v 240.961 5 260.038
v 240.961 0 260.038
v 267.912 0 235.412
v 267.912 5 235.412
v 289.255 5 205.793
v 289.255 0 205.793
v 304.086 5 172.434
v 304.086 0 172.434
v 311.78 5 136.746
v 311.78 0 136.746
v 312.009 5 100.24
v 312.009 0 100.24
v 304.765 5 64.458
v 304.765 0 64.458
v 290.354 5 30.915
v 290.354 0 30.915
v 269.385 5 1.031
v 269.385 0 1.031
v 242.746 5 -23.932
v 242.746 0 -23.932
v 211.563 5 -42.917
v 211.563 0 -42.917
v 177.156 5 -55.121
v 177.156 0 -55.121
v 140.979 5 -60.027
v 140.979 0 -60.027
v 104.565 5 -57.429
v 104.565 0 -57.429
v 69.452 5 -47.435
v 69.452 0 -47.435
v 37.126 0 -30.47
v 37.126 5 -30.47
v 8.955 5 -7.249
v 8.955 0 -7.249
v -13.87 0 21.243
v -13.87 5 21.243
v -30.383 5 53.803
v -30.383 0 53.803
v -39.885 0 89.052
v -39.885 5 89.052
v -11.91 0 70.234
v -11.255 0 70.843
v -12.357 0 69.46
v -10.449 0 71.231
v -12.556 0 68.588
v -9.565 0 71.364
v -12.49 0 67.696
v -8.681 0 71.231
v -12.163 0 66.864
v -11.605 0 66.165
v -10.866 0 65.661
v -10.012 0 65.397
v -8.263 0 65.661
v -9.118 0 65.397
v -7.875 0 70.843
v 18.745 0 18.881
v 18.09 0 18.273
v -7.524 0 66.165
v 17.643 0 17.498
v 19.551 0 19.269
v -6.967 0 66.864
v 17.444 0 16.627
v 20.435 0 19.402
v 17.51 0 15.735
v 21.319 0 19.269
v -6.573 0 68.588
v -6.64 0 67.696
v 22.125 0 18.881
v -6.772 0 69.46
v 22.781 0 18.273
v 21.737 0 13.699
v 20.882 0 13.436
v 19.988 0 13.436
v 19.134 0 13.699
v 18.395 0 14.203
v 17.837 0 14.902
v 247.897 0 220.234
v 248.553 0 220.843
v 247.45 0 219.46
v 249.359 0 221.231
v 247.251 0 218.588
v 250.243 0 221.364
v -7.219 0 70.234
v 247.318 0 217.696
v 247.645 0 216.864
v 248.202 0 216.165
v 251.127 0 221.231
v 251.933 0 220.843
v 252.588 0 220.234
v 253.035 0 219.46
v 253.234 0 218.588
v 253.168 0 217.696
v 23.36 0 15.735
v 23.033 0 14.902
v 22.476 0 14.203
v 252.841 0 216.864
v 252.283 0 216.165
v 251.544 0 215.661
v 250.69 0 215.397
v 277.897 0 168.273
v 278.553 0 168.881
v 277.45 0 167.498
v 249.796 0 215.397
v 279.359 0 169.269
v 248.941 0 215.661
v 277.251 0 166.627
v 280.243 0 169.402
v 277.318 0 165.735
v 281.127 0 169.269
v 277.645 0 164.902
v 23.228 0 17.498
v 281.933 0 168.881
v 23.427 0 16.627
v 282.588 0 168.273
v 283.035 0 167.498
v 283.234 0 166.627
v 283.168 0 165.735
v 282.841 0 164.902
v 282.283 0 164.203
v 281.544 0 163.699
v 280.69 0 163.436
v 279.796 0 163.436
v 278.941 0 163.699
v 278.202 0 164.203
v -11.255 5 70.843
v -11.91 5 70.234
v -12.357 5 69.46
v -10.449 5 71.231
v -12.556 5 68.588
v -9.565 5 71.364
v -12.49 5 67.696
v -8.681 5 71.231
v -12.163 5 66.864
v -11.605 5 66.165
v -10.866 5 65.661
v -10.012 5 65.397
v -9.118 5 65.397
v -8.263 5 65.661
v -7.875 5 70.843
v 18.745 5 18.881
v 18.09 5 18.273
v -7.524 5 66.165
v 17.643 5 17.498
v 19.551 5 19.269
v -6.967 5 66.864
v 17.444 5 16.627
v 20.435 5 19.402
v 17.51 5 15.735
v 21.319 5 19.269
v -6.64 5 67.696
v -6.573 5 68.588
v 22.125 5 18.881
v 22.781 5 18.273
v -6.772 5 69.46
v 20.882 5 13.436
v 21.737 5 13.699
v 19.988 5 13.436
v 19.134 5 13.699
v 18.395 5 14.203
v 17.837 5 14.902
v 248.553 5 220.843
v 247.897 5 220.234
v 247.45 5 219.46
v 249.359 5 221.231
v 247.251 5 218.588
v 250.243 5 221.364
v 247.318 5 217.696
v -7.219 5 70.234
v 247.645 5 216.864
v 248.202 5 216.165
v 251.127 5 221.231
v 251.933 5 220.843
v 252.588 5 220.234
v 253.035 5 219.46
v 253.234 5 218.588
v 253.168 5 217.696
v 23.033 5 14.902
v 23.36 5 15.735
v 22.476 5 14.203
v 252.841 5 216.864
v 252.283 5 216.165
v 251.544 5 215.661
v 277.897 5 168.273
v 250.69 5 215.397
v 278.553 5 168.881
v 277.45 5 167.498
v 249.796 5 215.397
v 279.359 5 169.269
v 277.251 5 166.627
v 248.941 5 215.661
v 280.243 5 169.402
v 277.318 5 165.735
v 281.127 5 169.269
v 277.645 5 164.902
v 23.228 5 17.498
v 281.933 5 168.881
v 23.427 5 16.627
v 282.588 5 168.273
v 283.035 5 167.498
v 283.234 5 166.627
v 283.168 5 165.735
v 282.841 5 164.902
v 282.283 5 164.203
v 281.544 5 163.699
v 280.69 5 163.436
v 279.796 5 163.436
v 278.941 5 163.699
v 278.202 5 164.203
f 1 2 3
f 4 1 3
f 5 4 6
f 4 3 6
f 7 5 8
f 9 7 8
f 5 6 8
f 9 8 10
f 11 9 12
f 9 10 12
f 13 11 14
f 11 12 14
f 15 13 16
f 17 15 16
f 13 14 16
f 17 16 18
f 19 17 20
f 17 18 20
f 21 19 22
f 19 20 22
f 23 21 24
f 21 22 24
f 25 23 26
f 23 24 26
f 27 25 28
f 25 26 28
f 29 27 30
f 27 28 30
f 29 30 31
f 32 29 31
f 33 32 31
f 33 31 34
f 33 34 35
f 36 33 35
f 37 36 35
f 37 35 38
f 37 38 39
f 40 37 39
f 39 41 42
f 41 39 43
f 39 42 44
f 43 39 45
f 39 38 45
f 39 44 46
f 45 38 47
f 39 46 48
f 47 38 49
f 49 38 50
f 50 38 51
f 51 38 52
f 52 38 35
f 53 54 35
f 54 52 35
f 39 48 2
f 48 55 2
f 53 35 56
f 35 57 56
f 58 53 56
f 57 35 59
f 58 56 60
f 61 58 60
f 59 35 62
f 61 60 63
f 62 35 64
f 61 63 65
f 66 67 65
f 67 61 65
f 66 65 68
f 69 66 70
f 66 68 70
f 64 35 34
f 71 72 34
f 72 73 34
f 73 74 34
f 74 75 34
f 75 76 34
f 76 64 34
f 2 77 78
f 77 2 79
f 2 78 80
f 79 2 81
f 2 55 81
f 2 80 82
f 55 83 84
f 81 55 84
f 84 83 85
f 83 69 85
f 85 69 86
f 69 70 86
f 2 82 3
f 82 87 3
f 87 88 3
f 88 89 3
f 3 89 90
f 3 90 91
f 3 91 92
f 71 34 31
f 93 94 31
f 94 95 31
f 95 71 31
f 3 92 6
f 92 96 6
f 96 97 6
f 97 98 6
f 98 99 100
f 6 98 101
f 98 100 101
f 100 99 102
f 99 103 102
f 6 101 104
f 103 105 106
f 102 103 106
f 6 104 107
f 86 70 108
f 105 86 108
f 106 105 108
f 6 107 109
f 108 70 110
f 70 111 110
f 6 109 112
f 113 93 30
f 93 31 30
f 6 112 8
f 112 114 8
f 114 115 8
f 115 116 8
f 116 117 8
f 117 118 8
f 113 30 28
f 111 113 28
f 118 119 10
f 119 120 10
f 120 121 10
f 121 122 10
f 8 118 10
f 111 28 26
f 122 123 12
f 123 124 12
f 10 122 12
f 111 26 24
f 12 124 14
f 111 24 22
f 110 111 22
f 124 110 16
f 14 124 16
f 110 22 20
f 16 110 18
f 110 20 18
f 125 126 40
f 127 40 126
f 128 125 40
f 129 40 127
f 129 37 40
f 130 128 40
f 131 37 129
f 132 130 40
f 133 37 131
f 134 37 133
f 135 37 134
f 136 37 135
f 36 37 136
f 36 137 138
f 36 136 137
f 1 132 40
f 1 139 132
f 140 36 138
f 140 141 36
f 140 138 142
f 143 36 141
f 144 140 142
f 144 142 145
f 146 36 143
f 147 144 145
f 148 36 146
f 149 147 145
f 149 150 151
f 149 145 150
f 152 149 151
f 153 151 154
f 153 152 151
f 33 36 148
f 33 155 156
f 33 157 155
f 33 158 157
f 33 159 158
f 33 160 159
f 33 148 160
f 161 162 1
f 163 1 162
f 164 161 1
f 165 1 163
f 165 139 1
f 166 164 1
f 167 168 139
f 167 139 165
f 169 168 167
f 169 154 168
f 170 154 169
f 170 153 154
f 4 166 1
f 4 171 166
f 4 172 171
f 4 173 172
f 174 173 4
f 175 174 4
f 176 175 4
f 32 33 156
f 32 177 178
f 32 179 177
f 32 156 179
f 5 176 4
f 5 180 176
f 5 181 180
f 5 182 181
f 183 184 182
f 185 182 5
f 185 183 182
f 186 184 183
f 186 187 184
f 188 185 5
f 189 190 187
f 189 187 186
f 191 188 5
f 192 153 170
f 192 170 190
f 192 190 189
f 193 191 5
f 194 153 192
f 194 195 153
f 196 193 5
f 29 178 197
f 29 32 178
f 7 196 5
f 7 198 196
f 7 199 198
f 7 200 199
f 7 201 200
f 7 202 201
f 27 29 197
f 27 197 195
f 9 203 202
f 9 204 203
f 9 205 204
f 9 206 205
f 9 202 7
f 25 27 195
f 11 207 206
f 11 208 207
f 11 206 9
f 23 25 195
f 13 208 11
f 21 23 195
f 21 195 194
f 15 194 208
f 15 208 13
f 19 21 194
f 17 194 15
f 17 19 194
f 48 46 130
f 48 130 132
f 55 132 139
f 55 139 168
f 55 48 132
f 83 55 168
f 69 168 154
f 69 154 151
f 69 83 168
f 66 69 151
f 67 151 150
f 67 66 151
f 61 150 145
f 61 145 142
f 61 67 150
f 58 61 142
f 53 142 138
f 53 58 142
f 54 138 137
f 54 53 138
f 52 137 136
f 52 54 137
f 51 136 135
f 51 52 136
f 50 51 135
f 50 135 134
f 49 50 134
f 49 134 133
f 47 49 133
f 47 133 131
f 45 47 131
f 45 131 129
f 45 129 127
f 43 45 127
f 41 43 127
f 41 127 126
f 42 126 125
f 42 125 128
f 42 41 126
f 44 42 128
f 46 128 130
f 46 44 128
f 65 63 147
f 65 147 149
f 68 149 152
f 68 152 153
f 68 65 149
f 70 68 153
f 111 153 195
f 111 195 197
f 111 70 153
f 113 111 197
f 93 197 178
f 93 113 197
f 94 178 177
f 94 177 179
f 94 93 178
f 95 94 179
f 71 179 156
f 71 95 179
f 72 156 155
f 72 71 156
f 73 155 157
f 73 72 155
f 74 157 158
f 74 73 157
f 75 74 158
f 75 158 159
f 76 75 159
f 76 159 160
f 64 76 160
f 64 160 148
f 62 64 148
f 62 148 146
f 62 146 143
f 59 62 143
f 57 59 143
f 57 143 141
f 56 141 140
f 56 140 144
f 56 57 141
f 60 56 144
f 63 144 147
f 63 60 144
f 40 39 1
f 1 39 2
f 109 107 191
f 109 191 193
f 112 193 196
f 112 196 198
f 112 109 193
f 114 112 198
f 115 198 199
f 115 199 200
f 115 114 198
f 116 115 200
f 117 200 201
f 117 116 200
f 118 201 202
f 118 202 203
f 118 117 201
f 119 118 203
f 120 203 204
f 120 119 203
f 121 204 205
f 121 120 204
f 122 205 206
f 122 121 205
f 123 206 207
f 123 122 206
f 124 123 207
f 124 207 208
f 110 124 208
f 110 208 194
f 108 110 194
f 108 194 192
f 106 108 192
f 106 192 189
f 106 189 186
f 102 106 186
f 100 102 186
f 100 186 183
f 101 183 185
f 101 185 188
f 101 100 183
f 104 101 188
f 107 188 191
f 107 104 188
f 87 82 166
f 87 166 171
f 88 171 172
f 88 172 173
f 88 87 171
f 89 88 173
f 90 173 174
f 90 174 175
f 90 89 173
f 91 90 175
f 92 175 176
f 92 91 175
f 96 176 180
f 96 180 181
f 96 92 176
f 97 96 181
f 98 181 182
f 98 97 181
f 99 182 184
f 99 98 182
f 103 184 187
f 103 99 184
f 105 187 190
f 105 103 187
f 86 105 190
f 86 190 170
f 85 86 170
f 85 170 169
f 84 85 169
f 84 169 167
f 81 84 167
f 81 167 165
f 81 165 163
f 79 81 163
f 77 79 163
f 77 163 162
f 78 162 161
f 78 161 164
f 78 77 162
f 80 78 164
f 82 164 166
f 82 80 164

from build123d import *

# Parameters (mm, degrees)
SKETCH_1_R      = 3
EXTRUDE_1_DEPTH = 5


with BuildPart() as part:
    # 草图1 → 凸台-拉伸1 (new body)
    with BuildSketch(Plane(origin=(0, 0, 0), x_dir=(1, 0, 0), z_dir=(0, 1, 0))):
        with BuildLine():
            Line((-39.885379482, -89.051728746), (240.960836827, -260.037504895))
            ThreePointArc((240.960836827, -260.037504895), (227.643725358, 34.228528193), (-39.885379482, -89.051728746))
        make_face()
        with Locations(Location((20.435189142, -16.402343887, 0), (0, 0, 270))):
            Circle(SKETCH_1_R, mode=Mode.SUBTRACT)
        with Locations(Location((-9.564810858, -68.363868114, 0), (0, 0, 270))):
            Circle(SKETCH_1_R, mode=Mode.SUBTRACT)
        with Locations(Location((250.242810277, -218.363868114, 0), (0, 0, 270))):
            Circle(SKETCH_1_R, mode=Mode.SUBTRACT)
        with Locations(Location((280.242810277, -166.402343887, 0), (0, 0, 270))):
            Circle(SKETCH_1_R, mode=Mode.SUBTRACT)
    extrude(amount=EXTRUDE_1_DEPTH)


solid = part.part
